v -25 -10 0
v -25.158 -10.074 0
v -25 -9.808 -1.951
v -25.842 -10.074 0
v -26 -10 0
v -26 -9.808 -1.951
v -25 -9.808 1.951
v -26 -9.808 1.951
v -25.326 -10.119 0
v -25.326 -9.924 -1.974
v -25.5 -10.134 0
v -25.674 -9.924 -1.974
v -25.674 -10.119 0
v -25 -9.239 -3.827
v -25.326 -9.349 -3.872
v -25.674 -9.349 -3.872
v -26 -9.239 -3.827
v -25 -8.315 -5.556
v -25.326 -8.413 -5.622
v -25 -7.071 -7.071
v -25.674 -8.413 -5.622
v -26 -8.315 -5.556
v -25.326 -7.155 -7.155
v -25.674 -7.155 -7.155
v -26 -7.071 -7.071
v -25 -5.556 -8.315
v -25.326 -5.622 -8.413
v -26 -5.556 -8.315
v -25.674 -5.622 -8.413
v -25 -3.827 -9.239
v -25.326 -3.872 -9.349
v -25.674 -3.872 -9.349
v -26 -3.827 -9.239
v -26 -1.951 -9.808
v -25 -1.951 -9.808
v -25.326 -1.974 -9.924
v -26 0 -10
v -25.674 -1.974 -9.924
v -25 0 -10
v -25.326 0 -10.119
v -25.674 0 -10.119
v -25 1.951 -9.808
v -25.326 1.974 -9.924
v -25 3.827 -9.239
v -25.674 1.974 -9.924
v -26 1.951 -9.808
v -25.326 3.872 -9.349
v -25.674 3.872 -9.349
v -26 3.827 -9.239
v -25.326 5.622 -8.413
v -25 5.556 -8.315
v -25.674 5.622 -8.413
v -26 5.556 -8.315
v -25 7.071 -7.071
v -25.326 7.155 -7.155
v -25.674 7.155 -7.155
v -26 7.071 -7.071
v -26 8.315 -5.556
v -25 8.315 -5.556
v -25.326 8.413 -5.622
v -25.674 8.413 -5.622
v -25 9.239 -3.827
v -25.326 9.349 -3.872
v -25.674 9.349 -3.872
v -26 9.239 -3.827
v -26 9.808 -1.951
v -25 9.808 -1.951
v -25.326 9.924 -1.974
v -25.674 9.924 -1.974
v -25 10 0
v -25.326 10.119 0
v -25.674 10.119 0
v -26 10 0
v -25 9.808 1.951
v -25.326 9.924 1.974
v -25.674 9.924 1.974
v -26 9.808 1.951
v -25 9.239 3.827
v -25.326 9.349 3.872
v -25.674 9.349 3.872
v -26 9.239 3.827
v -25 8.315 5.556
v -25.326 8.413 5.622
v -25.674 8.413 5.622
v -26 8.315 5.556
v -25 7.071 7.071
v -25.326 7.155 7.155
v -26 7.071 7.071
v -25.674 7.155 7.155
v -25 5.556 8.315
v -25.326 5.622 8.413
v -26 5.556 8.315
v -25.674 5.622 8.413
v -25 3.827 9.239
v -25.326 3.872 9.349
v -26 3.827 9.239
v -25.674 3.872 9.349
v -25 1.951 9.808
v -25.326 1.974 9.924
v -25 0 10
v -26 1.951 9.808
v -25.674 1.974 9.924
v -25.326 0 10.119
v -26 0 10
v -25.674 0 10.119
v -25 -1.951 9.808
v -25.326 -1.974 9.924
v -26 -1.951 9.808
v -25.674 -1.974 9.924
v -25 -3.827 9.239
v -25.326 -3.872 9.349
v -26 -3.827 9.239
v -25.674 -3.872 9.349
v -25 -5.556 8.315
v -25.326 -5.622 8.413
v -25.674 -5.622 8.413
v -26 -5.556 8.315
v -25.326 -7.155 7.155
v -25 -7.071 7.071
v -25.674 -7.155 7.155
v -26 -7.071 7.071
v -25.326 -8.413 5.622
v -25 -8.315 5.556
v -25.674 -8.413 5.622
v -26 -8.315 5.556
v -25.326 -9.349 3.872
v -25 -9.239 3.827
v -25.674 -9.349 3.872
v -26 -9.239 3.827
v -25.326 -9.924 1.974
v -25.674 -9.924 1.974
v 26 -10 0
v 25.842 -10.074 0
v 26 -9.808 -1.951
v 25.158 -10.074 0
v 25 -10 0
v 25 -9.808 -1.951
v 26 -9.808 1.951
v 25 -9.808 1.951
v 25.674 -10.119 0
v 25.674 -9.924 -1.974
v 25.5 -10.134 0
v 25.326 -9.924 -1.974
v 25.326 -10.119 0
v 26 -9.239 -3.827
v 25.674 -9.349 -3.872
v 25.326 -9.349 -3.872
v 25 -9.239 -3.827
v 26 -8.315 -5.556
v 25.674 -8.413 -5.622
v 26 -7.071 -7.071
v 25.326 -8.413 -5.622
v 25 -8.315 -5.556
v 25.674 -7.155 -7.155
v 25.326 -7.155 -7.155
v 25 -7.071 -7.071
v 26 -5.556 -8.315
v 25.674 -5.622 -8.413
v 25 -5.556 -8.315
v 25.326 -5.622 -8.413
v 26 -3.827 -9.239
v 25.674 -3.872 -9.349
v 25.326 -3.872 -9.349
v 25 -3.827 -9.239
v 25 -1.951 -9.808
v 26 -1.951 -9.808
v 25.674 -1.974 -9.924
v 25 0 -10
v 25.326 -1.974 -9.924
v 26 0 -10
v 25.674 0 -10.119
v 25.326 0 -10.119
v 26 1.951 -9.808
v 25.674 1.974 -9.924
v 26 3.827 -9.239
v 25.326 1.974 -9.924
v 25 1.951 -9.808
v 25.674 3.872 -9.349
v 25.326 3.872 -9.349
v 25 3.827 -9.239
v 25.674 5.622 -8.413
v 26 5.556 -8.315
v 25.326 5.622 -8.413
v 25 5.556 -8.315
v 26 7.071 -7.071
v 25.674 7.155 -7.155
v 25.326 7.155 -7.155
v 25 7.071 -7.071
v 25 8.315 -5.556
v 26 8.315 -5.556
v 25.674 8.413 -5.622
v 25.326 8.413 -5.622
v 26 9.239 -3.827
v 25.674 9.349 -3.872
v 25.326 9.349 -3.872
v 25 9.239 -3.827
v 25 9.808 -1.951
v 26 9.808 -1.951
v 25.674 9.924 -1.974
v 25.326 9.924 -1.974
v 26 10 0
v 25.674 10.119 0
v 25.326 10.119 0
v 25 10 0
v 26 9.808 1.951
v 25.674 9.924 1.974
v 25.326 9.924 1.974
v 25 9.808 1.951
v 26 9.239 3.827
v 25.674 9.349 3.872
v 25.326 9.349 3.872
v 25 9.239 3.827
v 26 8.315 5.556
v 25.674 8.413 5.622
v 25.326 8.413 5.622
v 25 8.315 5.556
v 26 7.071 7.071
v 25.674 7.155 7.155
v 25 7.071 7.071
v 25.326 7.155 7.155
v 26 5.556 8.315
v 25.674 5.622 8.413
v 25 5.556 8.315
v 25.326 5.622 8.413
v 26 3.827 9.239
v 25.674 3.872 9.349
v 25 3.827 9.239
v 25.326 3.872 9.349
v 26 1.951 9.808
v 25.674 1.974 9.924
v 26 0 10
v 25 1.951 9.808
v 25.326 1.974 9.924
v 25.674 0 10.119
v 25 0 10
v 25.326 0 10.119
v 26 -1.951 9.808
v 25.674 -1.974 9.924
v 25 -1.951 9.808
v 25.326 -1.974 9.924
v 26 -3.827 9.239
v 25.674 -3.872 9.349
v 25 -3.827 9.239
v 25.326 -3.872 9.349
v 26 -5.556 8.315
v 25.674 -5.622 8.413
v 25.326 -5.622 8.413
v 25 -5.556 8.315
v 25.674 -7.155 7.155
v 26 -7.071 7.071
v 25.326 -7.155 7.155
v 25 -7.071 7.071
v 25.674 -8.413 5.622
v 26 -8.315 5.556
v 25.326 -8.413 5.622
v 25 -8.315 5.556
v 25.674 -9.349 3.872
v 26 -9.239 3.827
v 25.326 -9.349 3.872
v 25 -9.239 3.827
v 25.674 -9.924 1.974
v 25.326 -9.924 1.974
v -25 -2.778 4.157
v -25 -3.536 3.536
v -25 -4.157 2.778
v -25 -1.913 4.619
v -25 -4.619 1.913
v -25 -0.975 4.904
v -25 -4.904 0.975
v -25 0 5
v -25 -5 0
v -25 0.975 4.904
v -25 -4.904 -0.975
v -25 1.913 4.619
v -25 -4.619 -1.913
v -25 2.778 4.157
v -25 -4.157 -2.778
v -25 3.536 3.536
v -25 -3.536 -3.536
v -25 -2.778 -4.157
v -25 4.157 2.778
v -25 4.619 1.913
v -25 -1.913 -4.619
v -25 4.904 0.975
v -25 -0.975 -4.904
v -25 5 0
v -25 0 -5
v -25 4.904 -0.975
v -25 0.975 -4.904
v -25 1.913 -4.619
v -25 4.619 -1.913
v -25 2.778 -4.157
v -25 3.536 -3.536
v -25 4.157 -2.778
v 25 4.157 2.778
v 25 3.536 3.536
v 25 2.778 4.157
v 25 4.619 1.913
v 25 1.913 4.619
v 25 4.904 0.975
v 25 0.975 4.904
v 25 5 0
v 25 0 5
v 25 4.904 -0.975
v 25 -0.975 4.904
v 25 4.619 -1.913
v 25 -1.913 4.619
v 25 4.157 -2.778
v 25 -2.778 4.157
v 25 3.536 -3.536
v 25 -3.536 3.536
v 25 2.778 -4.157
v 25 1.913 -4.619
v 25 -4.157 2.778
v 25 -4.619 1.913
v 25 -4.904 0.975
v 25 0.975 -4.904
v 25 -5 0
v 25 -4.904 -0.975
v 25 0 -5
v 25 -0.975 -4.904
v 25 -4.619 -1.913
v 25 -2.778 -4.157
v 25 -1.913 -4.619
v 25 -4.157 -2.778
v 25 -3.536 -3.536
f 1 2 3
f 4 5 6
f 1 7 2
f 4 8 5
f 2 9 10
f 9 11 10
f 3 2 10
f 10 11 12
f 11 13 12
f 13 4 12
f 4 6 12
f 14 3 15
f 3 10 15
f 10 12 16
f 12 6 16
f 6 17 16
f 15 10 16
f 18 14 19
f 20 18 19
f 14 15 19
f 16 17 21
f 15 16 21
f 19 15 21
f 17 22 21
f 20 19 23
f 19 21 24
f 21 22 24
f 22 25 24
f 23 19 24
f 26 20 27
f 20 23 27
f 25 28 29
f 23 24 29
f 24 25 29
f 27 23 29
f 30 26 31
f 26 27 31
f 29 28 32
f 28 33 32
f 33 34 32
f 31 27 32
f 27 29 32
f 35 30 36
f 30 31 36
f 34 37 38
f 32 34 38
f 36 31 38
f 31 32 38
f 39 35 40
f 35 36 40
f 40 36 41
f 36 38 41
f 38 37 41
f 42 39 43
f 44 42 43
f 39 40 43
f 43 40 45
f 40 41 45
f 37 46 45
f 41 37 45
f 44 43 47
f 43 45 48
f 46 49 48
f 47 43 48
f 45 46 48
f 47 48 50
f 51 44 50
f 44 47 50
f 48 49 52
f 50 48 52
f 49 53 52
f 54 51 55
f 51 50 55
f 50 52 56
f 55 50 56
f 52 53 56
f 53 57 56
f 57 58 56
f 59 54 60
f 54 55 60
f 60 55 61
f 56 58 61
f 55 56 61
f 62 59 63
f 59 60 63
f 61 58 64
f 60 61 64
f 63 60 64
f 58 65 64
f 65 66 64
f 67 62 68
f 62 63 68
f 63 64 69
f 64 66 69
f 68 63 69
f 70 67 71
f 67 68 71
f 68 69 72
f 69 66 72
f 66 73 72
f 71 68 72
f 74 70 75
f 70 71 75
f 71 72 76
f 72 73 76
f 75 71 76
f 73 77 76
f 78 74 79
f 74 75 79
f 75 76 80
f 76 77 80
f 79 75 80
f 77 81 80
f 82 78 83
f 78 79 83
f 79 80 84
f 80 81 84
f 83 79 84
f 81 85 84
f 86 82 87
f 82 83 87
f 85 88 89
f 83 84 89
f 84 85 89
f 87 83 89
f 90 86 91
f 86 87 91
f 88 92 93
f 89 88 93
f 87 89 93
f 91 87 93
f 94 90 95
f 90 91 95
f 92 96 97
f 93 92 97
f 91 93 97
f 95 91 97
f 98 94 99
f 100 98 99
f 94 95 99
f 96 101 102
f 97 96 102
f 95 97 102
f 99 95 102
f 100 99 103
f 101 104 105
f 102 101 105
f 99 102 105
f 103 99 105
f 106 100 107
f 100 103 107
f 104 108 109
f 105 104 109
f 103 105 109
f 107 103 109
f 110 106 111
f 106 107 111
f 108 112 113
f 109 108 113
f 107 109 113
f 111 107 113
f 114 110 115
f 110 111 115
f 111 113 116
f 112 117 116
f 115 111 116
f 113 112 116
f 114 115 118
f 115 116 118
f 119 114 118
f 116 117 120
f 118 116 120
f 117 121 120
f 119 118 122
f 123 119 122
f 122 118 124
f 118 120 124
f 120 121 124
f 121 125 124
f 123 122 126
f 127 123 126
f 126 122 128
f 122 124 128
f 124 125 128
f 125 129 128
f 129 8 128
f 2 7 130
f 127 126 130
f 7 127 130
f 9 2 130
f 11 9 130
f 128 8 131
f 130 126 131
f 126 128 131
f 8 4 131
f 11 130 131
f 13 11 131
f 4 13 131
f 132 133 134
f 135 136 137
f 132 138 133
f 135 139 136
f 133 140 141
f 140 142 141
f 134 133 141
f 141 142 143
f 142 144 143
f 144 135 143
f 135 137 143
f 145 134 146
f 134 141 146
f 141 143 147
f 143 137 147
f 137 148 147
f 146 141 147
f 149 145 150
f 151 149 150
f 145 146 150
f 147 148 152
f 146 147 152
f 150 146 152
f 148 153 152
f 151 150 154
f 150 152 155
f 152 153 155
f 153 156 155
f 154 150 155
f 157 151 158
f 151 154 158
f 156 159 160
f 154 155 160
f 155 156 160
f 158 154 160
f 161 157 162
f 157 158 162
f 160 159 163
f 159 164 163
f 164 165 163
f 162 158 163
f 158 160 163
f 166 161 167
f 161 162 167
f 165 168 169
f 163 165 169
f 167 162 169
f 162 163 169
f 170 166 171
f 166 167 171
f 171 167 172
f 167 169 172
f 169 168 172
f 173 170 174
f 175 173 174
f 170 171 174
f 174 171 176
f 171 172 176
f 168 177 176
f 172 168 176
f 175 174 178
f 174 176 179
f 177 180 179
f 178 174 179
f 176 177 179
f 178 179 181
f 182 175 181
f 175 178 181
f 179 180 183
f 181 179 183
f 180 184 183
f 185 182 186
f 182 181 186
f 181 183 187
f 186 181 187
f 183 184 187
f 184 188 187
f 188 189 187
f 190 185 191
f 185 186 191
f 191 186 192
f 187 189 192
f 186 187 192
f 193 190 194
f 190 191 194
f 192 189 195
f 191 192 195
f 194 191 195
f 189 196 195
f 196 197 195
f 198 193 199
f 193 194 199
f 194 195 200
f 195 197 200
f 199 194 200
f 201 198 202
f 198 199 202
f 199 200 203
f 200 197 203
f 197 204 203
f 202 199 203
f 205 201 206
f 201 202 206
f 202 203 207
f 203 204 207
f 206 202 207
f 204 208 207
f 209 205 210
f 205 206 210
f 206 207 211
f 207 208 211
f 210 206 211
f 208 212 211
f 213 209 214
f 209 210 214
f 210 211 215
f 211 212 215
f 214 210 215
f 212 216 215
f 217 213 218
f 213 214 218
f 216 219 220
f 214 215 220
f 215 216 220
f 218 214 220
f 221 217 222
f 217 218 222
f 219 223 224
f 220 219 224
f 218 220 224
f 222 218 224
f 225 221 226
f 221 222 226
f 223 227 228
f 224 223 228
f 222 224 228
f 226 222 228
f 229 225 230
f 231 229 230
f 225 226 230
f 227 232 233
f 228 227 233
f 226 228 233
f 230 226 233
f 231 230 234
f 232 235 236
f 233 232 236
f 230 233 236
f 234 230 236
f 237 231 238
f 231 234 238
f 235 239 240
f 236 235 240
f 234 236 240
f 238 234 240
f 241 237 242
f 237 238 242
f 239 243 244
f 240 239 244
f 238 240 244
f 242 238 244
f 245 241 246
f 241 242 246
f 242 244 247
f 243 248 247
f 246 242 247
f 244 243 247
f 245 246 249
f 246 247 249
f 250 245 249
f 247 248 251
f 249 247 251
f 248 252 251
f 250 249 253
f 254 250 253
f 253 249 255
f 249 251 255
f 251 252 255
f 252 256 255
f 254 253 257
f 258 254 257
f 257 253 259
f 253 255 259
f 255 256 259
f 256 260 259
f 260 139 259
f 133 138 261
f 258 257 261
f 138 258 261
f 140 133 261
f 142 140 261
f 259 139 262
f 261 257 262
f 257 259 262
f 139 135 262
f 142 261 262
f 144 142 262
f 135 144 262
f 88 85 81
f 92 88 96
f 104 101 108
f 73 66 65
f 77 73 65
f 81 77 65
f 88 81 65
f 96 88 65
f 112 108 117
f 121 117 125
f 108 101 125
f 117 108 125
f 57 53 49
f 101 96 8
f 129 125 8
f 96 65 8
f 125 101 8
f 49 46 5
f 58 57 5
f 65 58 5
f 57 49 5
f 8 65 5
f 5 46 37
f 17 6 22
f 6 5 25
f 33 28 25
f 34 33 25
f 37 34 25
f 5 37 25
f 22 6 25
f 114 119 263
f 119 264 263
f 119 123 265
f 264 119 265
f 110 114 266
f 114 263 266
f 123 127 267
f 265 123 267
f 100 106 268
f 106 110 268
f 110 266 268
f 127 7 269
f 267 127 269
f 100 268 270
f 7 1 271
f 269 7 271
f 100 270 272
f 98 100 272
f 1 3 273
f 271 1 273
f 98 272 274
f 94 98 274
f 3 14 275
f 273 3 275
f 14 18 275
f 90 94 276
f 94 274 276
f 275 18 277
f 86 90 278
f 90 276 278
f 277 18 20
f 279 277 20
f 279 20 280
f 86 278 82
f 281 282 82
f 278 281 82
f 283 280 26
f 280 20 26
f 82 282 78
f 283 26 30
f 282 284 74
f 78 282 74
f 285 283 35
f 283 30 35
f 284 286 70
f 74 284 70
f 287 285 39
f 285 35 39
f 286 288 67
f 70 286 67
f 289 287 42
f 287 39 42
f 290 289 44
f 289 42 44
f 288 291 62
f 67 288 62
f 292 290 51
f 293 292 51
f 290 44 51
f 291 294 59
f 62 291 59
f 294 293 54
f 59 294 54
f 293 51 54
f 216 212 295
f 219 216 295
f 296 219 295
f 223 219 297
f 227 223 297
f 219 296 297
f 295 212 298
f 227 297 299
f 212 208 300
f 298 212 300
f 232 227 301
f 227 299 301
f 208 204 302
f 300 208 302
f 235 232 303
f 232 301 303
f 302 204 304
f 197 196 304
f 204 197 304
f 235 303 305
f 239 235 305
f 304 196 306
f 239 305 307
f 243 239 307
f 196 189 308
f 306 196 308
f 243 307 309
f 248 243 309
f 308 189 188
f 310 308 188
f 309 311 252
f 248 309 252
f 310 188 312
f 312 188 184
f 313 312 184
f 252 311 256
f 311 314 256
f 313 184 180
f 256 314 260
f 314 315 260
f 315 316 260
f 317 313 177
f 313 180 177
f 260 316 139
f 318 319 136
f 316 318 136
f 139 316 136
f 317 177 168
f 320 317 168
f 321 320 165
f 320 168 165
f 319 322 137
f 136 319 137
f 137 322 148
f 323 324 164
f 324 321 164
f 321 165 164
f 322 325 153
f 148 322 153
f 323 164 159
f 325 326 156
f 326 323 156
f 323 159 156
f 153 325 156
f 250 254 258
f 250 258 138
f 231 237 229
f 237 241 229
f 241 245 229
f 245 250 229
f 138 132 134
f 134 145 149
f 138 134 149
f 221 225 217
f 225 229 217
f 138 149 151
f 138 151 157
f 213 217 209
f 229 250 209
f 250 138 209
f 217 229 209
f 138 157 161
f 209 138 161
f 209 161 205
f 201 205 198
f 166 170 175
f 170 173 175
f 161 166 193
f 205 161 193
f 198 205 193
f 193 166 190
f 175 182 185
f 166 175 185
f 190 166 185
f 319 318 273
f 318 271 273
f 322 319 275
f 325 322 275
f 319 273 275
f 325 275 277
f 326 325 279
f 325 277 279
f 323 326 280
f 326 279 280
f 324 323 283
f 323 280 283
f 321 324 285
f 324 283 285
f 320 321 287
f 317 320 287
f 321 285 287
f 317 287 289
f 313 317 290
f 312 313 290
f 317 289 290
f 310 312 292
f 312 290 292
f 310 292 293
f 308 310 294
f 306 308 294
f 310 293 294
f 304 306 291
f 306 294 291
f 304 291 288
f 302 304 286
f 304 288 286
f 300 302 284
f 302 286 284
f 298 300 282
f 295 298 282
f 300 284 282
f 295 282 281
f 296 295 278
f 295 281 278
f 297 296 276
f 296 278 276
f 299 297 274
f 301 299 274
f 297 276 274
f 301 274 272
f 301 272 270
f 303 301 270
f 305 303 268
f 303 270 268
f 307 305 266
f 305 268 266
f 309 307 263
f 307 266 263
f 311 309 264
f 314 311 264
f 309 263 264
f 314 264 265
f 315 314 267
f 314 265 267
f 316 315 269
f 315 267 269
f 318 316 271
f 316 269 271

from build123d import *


with BuildPart() as part:
    # Sketch1 → Revolve1 (revolve)
    with BuildSketch(Plane.XY):
        with BuildLine():
            Line((-26, 0), (26, 0))
            Line((26, 0), (26, -10))
            ThreePointArc((26, -10), (25.5, -10.133974596), (25, -10))
            Line((25, -10), (25, -5))
            Line((25, -5), (-25, -5))
            Line((-25, -5), (-25, -10))
            ThreePointArc((-25, -10), (-25.5, -10.133974596), (-26, -10))
            Line((-26, -10), (-26, 0))
        make_face()
    revolve(axis=Axis((-26, 0, 0), (1, 0, 0)))


solid = part.part
